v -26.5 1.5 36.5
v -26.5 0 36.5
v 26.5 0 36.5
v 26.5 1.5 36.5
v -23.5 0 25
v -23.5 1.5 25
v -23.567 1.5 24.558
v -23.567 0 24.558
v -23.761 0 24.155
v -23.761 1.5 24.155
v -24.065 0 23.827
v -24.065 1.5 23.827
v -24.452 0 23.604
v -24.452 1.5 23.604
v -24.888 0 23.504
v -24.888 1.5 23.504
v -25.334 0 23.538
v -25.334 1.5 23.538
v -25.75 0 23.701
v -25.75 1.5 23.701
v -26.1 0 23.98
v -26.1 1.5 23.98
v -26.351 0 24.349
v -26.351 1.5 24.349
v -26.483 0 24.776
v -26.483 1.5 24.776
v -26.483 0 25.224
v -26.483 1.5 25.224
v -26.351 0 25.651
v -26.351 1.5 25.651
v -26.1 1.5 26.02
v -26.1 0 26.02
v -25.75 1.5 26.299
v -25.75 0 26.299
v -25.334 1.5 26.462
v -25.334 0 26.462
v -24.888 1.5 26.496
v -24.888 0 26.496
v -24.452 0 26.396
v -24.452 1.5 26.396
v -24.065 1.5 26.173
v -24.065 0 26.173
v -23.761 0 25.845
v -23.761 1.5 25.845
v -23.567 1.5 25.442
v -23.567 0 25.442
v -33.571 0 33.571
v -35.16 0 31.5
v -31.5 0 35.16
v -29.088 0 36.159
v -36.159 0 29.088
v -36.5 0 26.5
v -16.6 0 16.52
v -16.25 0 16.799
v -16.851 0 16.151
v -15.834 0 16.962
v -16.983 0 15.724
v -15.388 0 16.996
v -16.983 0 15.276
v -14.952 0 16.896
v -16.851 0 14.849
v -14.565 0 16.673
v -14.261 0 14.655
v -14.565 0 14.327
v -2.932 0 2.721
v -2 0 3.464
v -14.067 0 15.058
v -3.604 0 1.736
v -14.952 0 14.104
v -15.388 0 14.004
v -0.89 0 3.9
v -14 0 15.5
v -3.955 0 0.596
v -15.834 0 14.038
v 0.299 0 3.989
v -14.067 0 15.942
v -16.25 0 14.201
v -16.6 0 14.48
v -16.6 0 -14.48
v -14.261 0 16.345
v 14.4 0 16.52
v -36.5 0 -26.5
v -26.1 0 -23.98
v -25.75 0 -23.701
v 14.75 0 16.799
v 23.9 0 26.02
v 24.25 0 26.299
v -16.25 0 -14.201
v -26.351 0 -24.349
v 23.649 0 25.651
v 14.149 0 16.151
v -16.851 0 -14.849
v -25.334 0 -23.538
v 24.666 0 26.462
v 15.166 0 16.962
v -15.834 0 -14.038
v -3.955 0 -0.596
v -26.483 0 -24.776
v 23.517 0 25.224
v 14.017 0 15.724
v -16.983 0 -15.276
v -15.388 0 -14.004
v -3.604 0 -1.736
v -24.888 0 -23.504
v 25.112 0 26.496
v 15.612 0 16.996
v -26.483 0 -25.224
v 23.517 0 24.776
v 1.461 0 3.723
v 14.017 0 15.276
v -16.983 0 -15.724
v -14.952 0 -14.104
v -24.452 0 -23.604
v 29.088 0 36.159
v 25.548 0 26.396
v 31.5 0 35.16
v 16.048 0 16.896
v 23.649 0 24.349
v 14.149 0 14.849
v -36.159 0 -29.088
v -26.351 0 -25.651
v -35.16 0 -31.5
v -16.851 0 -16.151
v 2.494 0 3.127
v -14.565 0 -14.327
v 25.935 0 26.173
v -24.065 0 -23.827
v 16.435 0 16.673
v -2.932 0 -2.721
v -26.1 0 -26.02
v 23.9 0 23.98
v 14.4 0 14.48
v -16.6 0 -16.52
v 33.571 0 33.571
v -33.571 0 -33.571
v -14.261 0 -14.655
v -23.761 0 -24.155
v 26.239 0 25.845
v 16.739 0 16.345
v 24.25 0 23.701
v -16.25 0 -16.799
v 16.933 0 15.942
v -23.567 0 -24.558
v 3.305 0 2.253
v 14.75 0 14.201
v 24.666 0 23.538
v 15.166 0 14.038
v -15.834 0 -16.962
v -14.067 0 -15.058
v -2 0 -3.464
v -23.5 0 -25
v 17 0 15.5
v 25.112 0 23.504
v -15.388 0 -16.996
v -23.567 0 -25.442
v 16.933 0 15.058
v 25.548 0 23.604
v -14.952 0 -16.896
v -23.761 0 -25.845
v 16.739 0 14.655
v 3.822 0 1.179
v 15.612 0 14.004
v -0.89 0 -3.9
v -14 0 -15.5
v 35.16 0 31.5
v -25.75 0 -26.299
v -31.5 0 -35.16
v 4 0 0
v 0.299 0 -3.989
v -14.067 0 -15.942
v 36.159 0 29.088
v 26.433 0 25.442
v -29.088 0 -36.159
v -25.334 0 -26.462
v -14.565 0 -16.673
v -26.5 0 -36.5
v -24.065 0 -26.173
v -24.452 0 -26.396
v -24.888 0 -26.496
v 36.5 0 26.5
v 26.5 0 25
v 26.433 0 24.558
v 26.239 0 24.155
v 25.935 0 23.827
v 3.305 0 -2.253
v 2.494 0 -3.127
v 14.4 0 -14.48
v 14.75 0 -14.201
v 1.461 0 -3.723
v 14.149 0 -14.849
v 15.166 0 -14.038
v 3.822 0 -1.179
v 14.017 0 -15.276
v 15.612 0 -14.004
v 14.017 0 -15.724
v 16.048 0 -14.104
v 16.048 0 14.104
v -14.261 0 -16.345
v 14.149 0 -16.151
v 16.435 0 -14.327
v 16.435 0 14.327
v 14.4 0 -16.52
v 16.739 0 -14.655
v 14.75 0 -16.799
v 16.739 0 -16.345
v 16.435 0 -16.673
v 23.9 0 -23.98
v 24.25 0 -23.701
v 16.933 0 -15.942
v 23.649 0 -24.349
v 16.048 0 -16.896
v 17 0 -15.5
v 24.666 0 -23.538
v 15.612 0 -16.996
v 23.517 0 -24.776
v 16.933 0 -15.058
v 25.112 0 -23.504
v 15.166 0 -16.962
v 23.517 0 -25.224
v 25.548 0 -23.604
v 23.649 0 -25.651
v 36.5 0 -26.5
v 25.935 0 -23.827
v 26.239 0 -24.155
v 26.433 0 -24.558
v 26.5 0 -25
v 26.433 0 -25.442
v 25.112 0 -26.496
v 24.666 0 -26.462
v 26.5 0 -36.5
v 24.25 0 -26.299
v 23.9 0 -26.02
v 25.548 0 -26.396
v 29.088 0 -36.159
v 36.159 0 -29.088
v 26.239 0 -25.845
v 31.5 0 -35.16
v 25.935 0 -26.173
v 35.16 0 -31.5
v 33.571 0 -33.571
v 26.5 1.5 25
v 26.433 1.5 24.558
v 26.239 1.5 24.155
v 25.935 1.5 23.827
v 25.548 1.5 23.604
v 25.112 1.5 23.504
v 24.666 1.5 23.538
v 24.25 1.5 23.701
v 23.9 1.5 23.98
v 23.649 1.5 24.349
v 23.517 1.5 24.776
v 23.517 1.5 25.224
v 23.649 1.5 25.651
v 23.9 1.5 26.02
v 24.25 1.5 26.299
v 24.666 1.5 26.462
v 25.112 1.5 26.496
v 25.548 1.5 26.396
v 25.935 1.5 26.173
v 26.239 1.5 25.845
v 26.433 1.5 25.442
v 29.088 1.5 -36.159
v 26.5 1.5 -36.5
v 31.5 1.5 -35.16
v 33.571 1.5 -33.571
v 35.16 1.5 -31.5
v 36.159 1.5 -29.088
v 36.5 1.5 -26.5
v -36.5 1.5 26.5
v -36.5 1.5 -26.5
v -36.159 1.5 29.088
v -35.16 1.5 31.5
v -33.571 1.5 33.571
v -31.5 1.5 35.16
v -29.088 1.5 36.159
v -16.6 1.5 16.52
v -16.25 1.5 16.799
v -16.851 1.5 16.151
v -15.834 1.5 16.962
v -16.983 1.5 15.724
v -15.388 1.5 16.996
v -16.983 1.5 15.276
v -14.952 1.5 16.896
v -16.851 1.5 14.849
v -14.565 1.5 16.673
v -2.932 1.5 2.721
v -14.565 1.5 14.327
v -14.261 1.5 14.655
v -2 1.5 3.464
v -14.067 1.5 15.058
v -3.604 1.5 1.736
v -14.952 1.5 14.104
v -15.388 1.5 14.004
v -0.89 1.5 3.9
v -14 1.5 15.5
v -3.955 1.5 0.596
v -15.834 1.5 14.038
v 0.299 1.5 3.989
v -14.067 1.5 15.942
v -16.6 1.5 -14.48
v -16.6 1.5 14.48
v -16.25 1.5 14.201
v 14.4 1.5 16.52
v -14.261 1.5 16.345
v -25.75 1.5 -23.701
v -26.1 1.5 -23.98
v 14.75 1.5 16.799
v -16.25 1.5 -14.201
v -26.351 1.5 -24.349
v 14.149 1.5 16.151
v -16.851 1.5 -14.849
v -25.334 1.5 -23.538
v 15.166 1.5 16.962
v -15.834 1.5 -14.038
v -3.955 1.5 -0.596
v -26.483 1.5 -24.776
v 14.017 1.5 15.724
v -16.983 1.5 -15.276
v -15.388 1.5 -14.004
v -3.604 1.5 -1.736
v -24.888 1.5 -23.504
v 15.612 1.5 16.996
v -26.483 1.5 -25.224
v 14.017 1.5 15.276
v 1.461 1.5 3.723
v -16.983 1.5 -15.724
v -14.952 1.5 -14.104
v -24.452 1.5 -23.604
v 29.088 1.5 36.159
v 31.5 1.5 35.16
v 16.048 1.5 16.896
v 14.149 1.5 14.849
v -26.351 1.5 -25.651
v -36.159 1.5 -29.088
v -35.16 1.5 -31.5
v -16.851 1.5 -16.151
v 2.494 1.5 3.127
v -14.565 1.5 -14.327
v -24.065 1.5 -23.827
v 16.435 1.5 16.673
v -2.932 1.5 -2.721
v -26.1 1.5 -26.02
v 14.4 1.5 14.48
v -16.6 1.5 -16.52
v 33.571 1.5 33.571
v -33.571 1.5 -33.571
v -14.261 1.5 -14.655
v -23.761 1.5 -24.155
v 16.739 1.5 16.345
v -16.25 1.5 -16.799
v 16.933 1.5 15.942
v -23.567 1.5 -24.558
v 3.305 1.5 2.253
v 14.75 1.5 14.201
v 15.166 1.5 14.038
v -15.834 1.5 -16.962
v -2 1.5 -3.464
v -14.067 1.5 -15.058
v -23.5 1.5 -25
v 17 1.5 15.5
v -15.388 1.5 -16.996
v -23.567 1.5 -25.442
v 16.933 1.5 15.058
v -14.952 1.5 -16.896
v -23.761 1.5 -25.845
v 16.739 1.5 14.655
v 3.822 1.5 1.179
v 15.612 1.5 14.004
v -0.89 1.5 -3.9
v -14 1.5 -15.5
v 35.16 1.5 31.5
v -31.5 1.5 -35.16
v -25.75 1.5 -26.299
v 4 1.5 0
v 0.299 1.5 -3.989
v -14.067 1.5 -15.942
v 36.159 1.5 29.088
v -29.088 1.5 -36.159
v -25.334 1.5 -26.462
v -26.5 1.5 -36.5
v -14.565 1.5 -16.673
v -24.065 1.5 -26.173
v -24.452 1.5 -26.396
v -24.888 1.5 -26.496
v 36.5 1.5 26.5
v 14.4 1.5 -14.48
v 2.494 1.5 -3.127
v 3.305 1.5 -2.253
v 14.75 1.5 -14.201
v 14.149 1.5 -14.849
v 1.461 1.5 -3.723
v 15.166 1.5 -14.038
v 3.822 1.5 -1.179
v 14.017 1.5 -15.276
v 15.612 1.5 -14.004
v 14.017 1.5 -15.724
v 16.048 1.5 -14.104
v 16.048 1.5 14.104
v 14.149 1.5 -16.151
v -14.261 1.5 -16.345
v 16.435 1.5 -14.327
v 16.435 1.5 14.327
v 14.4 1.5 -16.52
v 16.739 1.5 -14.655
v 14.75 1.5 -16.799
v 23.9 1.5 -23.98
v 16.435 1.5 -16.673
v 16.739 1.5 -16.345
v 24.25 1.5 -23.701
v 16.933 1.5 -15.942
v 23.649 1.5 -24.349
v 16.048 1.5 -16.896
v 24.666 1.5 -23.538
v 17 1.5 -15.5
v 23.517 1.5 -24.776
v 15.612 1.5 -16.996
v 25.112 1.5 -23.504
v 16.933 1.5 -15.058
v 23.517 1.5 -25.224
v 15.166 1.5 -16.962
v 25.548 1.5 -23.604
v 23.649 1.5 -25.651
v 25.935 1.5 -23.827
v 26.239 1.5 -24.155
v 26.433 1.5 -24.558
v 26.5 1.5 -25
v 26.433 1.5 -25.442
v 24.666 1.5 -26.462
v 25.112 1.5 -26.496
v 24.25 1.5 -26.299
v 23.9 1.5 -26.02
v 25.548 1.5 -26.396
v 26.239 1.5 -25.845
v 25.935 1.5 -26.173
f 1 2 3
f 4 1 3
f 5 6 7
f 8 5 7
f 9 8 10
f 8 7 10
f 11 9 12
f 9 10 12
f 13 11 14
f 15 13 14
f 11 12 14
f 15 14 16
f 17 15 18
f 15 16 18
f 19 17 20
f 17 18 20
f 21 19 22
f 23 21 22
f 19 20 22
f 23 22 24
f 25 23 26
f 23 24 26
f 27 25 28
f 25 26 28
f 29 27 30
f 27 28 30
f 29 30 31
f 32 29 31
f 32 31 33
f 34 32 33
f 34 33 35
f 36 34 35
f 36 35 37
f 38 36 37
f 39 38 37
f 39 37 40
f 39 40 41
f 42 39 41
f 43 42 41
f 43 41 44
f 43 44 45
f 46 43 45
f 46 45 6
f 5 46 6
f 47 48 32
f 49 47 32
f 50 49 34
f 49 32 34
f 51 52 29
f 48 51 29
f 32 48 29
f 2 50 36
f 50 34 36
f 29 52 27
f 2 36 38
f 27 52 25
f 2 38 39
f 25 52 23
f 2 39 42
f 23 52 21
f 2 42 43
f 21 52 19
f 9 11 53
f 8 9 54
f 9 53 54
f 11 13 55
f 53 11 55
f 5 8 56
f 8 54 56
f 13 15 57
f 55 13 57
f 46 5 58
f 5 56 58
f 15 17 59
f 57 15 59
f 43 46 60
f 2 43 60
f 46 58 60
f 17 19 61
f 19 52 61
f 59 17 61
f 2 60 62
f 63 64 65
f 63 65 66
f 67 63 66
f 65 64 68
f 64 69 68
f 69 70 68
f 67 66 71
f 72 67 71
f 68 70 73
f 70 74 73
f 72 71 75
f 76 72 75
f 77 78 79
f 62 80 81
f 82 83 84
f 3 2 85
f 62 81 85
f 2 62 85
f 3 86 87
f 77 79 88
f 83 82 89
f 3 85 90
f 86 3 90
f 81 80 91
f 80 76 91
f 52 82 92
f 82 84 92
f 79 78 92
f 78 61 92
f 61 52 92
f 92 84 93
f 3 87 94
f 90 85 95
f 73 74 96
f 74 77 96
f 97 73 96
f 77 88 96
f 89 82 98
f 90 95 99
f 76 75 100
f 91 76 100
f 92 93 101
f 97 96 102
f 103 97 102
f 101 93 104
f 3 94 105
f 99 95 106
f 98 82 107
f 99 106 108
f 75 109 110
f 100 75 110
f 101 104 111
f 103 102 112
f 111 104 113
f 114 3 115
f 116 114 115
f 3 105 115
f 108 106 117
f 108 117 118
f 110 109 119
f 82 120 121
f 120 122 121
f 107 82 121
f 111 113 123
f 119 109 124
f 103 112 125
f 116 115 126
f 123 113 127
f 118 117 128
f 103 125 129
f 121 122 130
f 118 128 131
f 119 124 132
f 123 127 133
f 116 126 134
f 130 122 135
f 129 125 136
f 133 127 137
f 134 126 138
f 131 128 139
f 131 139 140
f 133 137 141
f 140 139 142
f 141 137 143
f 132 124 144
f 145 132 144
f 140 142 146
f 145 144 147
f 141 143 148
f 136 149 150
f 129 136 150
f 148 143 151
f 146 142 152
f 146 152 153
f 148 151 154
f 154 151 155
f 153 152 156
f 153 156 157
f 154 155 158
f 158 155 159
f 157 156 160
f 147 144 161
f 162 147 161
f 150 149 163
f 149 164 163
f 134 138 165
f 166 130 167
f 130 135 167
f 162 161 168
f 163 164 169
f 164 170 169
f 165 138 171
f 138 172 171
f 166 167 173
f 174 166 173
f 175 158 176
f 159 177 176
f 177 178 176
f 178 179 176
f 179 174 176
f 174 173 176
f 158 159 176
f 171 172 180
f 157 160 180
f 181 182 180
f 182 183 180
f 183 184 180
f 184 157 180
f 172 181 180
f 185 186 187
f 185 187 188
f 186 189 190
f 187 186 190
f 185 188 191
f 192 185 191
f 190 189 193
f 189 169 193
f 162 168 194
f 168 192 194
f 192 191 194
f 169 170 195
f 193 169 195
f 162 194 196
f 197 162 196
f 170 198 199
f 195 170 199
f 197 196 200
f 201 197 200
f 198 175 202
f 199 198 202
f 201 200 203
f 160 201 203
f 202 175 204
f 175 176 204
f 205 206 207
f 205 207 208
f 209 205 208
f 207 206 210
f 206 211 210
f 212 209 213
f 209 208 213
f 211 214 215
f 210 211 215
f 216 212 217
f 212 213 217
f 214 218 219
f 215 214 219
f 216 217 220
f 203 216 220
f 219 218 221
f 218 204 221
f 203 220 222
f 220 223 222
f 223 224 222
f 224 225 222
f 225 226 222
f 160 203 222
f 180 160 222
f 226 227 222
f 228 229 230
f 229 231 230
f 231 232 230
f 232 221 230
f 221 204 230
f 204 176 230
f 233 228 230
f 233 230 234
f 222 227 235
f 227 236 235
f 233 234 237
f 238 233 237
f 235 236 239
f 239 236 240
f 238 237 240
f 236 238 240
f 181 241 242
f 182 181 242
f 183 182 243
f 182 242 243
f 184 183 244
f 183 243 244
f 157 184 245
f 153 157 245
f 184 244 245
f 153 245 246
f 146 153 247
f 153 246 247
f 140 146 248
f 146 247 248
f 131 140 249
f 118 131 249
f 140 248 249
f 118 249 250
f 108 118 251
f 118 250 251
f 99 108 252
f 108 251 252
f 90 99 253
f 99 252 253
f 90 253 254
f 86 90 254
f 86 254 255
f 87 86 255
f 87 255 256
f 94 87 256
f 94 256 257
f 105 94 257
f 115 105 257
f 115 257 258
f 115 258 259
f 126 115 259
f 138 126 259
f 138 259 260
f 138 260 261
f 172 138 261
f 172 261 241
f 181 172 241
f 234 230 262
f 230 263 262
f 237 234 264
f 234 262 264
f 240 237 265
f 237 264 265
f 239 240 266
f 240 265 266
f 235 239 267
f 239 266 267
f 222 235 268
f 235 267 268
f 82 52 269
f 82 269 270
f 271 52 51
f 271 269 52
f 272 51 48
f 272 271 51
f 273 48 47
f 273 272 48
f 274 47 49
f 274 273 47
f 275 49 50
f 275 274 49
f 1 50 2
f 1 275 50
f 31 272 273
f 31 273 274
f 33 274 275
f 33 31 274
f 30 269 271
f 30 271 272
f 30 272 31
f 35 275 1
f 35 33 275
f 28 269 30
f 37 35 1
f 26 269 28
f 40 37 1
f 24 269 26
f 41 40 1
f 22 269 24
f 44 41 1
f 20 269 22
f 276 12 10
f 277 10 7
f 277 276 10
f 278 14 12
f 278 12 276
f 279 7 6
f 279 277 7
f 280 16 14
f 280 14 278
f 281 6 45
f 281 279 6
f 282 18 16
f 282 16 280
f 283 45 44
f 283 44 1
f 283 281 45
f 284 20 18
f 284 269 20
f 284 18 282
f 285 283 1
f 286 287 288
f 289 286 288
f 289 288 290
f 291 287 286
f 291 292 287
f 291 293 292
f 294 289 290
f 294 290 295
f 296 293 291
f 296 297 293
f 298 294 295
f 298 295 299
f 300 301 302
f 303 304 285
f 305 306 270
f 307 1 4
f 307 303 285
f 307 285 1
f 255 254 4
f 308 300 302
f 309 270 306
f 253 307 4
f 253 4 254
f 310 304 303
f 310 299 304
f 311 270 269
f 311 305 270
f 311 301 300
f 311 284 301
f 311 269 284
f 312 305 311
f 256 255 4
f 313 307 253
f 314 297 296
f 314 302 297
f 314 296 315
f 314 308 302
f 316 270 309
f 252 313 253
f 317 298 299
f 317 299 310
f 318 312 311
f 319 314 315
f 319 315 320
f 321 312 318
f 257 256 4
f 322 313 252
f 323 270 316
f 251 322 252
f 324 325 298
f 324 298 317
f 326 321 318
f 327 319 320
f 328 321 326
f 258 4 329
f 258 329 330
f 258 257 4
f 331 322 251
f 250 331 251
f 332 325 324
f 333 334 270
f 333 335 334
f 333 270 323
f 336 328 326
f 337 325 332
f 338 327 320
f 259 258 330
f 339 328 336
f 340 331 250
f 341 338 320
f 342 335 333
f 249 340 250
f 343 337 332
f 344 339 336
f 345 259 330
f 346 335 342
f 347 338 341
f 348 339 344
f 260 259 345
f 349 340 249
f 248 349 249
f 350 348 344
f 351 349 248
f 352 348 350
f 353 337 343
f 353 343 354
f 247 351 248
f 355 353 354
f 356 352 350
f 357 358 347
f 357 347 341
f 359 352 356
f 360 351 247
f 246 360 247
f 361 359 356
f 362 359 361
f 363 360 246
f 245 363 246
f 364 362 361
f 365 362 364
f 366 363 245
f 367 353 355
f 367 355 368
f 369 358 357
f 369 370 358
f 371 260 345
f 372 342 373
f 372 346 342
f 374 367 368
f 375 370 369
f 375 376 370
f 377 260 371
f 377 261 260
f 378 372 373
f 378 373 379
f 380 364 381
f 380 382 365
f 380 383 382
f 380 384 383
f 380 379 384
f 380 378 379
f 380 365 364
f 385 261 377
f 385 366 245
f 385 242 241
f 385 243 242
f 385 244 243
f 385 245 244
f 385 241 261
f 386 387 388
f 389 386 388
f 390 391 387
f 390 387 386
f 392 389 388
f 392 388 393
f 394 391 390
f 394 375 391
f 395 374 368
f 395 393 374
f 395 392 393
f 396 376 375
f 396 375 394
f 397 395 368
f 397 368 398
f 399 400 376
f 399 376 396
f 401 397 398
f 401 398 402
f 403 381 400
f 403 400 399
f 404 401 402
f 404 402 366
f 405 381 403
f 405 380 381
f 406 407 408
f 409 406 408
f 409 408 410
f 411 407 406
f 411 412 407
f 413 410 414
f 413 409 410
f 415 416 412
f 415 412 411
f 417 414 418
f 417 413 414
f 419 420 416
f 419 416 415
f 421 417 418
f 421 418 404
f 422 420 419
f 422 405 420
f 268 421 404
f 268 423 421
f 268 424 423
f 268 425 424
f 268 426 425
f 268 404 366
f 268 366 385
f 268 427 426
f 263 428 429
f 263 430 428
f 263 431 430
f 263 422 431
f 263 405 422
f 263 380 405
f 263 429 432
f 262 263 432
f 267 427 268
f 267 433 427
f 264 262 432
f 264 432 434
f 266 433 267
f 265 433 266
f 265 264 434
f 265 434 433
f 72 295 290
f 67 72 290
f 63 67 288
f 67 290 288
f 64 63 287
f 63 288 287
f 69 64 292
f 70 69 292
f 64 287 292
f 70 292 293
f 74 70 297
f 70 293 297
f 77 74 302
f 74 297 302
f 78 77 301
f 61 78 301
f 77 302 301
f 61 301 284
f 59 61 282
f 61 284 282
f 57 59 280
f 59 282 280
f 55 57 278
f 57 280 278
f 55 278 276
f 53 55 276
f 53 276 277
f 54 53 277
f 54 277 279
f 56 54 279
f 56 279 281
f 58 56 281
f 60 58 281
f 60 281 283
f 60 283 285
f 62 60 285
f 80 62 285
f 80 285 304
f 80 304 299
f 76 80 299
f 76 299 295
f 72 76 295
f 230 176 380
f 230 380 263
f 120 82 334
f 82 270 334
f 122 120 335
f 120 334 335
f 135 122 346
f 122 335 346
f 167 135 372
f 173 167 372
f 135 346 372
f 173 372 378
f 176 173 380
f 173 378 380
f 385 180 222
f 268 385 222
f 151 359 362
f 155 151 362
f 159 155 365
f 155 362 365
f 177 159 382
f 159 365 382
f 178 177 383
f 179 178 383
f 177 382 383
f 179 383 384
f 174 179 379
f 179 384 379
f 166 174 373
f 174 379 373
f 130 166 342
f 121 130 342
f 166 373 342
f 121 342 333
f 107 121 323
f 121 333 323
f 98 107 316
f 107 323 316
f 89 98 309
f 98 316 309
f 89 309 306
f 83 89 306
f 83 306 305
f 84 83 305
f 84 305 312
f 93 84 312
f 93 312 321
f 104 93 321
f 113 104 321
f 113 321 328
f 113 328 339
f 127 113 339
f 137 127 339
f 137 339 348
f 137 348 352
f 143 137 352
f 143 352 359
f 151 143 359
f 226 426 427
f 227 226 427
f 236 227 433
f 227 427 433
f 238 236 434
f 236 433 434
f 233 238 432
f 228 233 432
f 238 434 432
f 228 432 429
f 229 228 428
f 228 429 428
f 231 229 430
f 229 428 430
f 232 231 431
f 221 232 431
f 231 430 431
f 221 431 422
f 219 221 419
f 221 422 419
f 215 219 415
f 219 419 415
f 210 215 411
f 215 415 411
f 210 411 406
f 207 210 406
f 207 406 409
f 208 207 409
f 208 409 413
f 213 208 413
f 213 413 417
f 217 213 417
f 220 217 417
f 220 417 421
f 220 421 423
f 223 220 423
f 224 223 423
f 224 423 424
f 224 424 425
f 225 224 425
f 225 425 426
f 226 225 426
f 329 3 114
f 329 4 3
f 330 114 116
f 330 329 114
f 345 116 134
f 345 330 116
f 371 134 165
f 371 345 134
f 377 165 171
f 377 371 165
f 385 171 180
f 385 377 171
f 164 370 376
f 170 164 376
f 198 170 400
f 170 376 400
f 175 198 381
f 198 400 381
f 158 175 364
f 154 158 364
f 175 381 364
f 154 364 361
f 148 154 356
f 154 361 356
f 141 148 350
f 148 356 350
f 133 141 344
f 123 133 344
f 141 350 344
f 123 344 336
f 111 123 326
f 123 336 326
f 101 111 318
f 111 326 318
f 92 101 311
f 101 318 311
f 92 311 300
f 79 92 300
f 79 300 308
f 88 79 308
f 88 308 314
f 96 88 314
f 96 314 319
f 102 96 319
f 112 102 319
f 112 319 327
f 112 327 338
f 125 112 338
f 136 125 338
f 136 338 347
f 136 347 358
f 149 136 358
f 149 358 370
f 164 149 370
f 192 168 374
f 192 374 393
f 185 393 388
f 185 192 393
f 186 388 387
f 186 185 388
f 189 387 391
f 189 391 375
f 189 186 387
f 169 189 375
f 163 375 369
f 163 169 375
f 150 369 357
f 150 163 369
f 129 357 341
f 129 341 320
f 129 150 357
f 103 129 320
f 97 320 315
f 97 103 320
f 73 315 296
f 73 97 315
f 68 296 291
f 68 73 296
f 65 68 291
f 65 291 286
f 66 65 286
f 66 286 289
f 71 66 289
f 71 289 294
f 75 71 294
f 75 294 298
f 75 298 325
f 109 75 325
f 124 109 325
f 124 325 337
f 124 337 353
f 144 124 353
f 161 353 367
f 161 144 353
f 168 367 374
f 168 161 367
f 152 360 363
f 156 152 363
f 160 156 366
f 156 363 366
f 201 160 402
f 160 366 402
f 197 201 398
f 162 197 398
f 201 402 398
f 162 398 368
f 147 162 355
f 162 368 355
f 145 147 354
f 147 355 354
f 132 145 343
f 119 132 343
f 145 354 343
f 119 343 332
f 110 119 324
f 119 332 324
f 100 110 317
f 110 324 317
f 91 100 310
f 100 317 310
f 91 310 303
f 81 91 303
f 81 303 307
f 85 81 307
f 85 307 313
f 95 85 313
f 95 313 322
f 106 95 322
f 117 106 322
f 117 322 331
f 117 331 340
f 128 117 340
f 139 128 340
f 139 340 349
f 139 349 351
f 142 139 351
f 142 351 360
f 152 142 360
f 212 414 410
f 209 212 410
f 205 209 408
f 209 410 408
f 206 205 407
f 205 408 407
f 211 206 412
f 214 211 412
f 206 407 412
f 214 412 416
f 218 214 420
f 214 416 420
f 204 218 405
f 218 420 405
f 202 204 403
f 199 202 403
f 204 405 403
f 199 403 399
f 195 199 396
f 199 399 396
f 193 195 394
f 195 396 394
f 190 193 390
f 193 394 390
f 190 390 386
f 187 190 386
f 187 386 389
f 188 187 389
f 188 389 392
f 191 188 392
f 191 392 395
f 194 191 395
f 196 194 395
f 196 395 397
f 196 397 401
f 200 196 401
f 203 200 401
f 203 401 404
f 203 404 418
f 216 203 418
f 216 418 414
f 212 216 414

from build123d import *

# Parameters (mm, degrees)
SKETCH2_W           = 73
SKETCH2_H           = 73
SKETCH2_R           = 4
BOSS_EXTRUDE1_DEPTH = 1.5
SKETCH3_R           = 1.5
CUT_EXTRUDE1_DEPTH  = 2.5
SKETCH4_R           = 1.5
CUT_EXTRUDE2_DEPTH  = 2.5
FILLET1_R           = 10


with BuildPart() as part:
    # Sketch2 → Boss-Extrude1 (new body)
    with BuildSketch(Plane(origin=(0, 0, 0), x_dir=(1, 0, 0), z_dir=(0, 1, 0))):
        Rectangle(SKETCH2_W, SKETCH2_H)
        Circle(SKETCH2_R, mode=Mode.SUBTRACT)
    extrude(amount=BOSS_EXTRUDE1_DEPTH)

    # Sketch3 → Cut-Extrude1 (cut, through all)
    with BuildSketch(Plane(origin=(0, 1.5, 0), x_dir=(1, 0, 0), z_dir=(0, 1, 0))):
        with Locations((-15.5, 15.5)):
            Circle(SKETCH3_R)
        with Locations((15.5, 15.5)):
            Circle(SKETCH3_R)
        with Locations((15.5, -15.5)):
            Circle(SKETCH3_R)
        with Locations((-15.5, -15.5)):
            Circle(SKETCH3_R)
    extrude(amount=-CUT_EXTRUDE1_DEPTH, mode=Mode.SUBTRACT)

    # Sketch4 → Cut-Extrude2 (cut, through all)
    with BuildSketch(Plane(origin=(0, 1.5, 0), x_dir=(1, 0, 0), z_dir=(0, 1, 0))):
        with Locations((-25, 25)):
            Circle(SKETCH4_R)
        with Locations((25, 25)):
            Circle(SKETCH4_R)
        with Locations((25, -25)):
            Circle(SKETCH4_R)
        with Locations((-25, -25)):
            Circle(SKETCH4_R)
    extrude(amount=-CUT_EXTRUDE2_DEPTH, mode=Mode.SUBTRACT)

    # Fillet1
    fillet1_edges = [part.edges().sort_by_distance(p)[0] for p in [
        (36.5, 0.75, 36.5),
        (-36.5, 0.75, 36.5),
        (-36.5, 0.75, -36.5),
        (36.5, 0.75, -36.5),
    ]]
    fillet(fillet1_edges, radius=FILLET1_R)


solid = part.part
